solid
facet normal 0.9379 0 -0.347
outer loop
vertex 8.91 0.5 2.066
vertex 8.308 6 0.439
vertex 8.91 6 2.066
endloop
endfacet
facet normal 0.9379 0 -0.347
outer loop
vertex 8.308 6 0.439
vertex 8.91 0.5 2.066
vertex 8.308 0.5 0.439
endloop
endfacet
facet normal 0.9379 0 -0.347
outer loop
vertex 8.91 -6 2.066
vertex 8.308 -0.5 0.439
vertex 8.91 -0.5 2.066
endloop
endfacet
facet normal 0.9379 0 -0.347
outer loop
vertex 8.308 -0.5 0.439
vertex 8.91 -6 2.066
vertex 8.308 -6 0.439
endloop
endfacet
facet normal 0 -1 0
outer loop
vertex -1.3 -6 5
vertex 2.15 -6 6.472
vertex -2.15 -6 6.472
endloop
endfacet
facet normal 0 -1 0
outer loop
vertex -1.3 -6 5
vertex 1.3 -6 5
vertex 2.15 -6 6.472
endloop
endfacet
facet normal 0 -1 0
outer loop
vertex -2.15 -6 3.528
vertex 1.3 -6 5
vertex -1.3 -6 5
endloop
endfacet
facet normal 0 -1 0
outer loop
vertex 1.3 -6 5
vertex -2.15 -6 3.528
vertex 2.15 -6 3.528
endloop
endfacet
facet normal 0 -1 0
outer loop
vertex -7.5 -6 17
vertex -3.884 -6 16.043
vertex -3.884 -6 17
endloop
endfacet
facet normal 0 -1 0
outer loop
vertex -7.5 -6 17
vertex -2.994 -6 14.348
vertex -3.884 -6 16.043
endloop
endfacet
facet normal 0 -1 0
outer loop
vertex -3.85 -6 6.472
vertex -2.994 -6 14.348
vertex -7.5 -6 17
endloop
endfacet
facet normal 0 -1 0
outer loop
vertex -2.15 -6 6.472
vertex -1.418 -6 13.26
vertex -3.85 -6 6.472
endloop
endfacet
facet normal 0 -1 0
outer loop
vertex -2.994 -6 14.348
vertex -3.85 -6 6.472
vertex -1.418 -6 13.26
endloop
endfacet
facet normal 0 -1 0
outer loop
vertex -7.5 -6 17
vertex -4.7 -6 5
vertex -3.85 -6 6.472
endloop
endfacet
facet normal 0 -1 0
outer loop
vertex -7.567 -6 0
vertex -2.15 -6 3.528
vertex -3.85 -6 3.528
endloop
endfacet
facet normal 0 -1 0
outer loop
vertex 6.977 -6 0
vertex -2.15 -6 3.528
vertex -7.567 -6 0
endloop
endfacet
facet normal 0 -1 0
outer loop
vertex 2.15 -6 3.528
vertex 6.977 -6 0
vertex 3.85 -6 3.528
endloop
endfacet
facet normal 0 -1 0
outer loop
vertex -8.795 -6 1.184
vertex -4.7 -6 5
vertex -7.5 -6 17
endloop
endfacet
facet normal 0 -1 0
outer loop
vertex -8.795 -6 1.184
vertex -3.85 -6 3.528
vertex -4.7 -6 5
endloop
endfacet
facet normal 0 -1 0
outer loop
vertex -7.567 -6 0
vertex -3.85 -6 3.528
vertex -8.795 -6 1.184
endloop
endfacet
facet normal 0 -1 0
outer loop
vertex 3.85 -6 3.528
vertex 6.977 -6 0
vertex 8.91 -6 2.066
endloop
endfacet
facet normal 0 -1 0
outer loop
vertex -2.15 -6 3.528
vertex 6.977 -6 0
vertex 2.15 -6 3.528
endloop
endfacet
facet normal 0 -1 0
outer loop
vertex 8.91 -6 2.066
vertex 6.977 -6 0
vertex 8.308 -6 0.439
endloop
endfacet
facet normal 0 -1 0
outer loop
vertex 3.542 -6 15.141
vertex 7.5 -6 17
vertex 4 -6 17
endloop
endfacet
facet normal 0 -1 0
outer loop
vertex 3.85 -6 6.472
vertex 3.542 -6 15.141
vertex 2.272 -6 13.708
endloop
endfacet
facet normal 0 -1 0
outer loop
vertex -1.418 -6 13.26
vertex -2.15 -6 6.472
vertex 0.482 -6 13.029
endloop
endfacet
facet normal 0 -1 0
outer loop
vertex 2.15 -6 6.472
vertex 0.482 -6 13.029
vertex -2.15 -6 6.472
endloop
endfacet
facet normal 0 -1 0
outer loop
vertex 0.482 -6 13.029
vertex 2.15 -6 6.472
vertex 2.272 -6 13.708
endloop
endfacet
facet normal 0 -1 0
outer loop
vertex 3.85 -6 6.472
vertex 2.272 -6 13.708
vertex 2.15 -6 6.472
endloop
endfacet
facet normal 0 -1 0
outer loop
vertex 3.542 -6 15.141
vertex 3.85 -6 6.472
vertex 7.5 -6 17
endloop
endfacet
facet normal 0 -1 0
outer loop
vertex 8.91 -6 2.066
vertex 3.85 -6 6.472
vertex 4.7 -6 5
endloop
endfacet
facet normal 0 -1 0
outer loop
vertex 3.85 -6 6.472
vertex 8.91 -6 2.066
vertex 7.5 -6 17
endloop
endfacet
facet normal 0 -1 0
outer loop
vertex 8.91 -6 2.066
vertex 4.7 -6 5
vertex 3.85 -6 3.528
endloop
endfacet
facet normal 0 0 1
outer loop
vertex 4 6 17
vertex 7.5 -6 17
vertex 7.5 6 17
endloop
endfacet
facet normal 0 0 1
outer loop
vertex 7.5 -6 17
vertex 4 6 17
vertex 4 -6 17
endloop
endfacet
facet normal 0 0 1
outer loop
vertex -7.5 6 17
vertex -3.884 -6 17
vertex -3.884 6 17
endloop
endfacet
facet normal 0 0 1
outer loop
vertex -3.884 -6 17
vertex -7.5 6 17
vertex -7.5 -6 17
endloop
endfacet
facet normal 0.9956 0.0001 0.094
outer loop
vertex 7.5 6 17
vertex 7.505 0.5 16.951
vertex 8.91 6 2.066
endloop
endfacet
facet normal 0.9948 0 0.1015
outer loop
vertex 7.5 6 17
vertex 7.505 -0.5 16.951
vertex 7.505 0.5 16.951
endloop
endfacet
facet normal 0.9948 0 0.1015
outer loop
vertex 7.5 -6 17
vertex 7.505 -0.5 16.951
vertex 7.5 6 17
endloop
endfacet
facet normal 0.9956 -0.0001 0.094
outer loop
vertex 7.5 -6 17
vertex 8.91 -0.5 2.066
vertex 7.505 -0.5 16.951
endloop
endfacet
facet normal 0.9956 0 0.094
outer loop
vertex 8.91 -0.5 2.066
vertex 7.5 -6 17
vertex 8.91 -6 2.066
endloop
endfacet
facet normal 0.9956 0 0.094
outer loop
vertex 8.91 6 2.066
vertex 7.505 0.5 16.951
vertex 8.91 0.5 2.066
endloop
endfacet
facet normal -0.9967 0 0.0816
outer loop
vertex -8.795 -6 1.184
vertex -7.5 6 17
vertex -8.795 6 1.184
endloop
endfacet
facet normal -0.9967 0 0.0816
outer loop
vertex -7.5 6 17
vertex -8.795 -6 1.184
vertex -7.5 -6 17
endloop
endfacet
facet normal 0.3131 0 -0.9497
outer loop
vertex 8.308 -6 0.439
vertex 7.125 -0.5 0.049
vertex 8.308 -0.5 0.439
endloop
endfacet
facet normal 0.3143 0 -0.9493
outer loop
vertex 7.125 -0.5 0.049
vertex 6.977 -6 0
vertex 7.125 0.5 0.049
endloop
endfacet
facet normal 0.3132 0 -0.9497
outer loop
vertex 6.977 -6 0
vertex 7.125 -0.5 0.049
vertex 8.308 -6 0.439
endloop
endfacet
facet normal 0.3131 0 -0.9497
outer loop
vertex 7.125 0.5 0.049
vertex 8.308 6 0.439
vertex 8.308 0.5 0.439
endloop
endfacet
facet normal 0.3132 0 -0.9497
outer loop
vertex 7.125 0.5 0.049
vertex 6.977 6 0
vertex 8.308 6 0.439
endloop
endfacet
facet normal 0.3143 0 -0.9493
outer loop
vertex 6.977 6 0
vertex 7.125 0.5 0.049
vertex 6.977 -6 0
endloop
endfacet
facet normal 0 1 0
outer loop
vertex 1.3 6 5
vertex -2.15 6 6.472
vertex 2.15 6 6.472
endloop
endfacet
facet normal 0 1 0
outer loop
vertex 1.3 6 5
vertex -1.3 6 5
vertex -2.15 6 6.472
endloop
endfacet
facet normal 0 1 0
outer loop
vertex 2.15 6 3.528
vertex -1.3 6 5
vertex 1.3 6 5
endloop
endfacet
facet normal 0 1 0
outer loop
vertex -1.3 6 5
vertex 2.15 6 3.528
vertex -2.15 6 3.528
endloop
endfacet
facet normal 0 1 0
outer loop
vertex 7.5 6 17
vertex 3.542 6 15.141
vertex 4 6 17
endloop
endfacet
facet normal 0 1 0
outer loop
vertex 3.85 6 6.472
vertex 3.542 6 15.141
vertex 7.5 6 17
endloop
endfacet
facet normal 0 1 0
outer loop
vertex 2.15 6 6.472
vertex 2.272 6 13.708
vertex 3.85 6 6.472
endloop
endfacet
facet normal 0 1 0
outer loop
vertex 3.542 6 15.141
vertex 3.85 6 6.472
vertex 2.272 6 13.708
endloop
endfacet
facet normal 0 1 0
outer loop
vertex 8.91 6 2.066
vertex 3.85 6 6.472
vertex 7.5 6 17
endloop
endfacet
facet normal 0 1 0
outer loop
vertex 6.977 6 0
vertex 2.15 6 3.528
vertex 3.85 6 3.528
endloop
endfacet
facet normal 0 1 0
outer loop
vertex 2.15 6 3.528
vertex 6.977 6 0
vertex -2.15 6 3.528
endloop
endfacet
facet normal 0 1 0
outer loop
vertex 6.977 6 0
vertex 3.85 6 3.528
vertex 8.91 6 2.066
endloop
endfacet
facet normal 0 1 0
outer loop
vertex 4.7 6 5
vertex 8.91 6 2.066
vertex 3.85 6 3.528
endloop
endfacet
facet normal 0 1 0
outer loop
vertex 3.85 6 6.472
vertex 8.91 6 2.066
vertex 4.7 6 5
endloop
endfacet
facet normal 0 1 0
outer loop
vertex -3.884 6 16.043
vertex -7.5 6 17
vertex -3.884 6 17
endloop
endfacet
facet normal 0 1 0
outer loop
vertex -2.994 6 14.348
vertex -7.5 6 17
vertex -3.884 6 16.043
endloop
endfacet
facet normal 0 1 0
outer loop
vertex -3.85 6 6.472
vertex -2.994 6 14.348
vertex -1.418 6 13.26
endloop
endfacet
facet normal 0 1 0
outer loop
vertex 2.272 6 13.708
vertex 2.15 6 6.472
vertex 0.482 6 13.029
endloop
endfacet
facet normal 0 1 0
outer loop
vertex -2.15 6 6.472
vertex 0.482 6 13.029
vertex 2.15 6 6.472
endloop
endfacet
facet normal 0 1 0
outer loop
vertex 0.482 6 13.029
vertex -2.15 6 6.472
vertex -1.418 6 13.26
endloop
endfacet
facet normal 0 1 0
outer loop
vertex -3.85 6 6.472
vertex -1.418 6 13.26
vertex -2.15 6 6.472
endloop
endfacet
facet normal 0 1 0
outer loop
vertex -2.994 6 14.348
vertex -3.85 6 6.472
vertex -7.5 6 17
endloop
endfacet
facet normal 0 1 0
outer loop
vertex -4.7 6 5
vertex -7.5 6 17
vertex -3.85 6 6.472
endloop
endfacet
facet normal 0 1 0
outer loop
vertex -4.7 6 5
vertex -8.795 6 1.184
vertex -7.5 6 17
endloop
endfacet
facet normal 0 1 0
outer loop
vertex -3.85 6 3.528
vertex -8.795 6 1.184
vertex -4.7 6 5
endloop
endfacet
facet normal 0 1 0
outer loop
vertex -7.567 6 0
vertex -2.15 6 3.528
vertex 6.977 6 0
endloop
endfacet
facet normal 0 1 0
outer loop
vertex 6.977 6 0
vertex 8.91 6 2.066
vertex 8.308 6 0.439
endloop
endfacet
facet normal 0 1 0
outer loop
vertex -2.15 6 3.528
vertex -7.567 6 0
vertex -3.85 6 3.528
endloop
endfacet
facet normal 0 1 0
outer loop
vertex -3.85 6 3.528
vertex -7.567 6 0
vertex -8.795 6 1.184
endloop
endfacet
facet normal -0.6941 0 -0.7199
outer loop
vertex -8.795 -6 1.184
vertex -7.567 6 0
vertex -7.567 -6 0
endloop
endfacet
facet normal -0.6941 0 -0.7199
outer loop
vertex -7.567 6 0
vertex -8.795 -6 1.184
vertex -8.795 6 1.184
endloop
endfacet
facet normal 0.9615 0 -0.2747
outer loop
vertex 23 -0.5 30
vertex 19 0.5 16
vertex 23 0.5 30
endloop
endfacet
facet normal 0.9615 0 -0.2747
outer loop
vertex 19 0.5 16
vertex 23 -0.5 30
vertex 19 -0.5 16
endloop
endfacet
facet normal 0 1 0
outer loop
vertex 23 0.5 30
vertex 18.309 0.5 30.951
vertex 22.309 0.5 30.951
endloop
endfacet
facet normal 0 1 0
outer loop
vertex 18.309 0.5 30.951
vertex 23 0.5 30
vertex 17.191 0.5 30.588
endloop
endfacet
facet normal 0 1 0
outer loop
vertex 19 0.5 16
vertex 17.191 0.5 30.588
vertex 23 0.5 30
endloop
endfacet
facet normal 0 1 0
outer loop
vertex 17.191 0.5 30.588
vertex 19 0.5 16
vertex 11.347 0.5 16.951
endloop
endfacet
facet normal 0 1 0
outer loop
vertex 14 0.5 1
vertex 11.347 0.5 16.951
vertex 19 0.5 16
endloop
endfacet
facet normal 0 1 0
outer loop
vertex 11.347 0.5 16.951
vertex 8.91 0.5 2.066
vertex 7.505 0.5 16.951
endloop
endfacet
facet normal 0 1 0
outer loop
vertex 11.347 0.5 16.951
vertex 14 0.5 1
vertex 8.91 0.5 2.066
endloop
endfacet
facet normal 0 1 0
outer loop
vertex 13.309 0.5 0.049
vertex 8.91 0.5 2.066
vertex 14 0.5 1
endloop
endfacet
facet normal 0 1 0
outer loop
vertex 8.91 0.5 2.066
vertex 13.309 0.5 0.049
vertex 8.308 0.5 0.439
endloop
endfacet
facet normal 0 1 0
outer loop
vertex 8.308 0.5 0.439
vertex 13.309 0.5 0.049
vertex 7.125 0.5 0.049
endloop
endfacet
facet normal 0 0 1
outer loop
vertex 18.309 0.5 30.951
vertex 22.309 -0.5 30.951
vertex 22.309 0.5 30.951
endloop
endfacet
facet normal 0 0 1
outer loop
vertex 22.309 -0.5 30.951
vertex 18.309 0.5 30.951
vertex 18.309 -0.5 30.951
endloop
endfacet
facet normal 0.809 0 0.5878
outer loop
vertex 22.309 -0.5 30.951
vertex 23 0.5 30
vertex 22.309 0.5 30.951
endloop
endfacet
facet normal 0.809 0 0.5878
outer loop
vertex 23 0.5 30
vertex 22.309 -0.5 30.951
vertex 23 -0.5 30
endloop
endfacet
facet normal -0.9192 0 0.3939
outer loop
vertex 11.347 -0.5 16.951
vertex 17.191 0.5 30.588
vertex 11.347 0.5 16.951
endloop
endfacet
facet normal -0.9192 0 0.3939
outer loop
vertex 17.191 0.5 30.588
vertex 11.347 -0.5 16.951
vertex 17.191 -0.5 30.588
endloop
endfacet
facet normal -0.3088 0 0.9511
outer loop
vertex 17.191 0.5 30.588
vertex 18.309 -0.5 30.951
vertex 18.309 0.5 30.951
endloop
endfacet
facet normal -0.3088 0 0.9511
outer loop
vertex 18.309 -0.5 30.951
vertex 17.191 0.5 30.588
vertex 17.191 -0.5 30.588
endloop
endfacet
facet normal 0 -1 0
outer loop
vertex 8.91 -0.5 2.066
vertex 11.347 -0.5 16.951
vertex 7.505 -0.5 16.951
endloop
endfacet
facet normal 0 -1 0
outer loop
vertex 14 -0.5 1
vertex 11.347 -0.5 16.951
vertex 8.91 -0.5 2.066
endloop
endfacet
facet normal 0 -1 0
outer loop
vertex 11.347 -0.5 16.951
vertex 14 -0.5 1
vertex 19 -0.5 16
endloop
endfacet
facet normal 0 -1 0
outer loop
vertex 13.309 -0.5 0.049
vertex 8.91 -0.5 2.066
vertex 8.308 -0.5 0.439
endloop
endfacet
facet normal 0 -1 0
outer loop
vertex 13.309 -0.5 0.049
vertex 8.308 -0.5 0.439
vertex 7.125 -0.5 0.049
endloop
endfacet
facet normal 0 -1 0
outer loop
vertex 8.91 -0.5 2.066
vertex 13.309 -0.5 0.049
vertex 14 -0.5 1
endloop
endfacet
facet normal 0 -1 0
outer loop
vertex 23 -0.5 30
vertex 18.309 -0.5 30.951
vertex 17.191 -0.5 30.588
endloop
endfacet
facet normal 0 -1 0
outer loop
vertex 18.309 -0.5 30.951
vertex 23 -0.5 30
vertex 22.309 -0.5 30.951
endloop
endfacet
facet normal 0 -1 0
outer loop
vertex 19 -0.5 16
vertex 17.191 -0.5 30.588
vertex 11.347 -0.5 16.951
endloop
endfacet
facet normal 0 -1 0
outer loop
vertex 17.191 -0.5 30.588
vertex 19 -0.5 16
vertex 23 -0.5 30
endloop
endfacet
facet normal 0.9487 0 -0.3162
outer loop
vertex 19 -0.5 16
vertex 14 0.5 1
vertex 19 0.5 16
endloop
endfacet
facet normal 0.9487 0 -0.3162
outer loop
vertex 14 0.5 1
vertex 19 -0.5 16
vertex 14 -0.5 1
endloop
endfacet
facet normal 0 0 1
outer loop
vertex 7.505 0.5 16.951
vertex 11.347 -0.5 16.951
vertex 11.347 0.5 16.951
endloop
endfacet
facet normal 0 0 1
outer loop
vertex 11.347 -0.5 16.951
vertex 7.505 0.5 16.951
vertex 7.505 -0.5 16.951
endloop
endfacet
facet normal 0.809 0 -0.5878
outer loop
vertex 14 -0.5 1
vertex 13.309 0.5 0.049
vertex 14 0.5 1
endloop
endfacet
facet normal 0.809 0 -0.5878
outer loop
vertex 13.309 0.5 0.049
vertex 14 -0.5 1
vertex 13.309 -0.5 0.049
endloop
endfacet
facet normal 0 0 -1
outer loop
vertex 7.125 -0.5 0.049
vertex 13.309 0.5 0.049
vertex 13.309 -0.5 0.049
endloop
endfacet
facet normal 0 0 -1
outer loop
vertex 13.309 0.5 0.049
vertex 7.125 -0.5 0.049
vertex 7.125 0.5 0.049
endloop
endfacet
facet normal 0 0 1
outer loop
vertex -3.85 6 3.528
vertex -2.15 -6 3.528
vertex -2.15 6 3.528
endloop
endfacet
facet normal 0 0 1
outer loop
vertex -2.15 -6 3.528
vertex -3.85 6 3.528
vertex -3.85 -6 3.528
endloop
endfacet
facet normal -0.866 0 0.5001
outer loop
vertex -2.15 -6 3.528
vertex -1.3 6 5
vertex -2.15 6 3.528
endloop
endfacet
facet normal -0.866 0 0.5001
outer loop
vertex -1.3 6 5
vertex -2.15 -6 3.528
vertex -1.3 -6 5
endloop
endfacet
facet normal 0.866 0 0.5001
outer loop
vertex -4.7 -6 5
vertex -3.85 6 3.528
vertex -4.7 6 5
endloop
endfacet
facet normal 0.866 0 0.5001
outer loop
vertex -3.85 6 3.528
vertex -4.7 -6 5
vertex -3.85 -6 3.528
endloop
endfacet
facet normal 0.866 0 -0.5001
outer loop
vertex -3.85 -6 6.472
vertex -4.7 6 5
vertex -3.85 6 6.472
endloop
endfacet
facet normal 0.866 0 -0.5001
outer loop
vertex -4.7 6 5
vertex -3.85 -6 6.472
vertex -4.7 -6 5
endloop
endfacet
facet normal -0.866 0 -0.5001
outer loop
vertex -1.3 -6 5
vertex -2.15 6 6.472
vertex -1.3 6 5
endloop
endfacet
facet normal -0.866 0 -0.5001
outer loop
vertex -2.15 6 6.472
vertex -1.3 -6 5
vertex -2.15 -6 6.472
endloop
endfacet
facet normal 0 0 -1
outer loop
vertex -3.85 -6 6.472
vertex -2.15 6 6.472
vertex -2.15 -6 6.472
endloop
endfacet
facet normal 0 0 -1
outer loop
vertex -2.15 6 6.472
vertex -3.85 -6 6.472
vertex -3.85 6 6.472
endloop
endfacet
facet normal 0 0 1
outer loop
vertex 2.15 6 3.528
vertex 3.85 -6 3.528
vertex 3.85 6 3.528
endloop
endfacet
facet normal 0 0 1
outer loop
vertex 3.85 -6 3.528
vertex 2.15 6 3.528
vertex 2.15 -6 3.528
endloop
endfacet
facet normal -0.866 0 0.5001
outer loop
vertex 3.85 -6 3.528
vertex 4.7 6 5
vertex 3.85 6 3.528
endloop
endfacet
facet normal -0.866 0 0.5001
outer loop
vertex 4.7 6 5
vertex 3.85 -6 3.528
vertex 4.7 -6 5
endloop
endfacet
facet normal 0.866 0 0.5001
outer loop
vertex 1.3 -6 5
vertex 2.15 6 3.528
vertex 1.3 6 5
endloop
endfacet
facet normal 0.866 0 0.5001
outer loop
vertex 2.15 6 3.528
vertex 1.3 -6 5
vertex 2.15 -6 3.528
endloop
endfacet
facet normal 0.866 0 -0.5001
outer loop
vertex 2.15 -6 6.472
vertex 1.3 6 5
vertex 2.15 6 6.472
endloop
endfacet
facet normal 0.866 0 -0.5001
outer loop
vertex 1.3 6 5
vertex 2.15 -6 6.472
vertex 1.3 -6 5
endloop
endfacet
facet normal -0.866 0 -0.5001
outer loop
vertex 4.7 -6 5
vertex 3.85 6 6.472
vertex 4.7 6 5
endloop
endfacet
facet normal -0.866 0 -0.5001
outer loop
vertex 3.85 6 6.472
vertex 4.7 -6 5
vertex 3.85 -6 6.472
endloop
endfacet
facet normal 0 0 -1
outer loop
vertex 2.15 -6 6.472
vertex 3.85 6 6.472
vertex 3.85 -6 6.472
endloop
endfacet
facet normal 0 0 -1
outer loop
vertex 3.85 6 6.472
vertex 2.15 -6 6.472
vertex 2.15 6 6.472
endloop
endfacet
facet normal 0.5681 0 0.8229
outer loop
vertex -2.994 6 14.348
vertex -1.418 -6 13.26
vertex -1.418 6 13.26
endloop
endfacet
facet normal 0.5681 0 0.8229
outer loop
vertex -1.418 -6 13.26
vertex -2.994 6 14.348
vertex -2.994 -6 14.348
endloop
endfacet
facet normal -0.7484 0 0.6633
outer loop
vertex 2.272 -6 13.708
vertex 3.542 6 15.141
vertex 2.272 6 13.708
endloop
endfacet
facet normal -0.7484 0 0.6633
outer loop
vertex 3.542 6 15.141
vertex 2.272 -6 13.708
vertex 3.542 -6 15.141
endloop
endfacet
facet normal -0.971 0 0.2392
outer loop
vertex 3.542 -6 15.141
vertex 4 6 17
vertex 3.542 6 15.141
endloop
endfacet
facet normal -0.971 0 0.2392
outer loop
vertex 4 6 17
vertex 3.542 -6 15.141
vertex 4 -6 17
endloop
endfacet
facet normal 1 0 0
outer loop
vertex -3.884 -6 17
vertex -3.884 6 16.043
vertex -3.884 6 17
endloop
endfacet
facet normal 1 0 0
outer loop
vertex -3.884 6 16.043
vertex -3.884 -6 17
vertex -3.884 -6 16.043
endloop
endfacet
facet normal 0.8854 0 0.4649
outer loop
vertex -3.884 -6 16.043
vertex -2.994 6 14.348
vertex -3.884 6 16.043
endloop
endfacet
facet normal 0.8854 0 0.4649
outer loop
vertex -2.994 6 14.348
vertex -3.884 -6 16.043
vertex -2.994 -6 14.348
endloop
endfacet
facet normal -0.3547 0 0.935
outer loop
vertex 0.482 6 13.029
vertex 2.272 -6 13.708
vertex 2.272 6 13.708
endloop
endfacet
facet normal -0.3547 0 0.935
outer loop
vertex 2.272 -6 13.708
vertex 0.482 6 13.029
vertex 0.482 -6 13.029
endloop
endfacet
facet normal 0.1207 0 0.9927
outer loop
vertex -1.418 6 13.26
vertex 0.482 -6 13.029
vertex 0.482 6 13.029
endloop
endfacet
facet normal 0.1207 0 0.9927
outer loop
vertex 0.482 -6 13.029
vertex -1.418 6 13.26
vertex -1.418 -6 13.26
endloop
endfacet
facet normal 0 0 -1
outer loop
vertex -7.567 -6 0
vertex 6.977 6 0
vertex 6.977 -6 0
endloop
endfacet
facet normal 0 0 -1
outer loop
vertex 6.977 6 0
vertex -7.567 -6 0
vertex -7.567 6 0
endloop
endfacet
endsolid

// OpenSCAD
// file: shapes.scad
// 2D basic shapes
module inverseQuarterCircle(r) {
    difference() {
        square([2*r,2*r]);
        translate([r,r])circle(r=r);
        translate([r,0])square([r,2*r]);
        translate([0,r])square([2*r,r]);
    }
}


module catenary(length=100, width=5, a = 25, step=1) {
    function f(x) = width-(a*cosh(x/length)-a);
    for (i = [-length/2 + step : step : length/2]) {
        //echo("i = ", i, " f(i) = ", f(i));
        polygon([[i-step,0],[i,0],[i,f(i)],[i-step,f(i-step)]]);
    }
}

// 3D basic shapes

module roundedCube(size = [10,10,10],radius=1) {
    hull() {
        // bottom
        translate([size[0]-radius,size[1]-radius,radius])sphere(r=radius,center=true);
        translate([size[0]-radius,radius,radius])sphere(r=radius,center=true);
        translate([radius,size[1]-radius,radius])sphere(r=radius,center=true);
        translate([radius,radius,radius])sphere(r=radius,center=true);
        // top
        translate([size[0]-radius,size[1]-radius,size[2]-radius])sphere(r=radius,center=true);
        translate([size[0]-radius,radius,size[2]-radius])sphere(r=radius,center=true);
        translate([radius,size[1]-radius,size[2]-radius])sphere(r=radius,center=true);
        translate([radius,radius,size[2]-radius])sphere(r=radius,center=true);

    }
}

module roundedCylinder(d, h,rr=1, fn=$fn) {
    translate([0,0,rr])minkowski() {
        cylinder(d=d-2*rr, h=h-2*rr, $fn=fn);
        sphere(r=rr, center = true);
    }
}

module roundedBox(size = [1,1,1],radius=1) {
    hull() {
        translate([size[0]-radius,size[1]-radius,size[2]/2])cylinder(r=radius,h=size[2],center=true);
        translate([size[0]-radius,radius,size[2]/2])cylinder(r=radius,h=size[2],center=true);
        translate([radius,size[1]-radius,size[2]/2])cylinder(r=radius,h=size[2],center=true);
        translate([radius,radius,size[2]/2])cylinder(r=radius,h=size[2],center=true);
    }
}
// file: configuration.scad
print_layer_height = 0.25;
// Using a 623ZZ bearing
bearing_od = 10;
bearing_id = 3;
bearing_h = 4;

m2_dia = 2.4;
m2_nut_dia = 4.5;
m2_nut_slot = 3.9;
m2_nut_height = 2;

m3_dia = 3.4;
m3_nut_dia = 6.8;
m3_nut_slot = 5.8;
m3_nut_height = 3;

m4_dia = 4.5;
m4_nut_dia = 9;
m4_nut_height = 4;

e = 2.718281828;
pi = 3.1415926536;

function cosh(x) = (1 + pow(e, -2 * x)) / (2 * pow(e, -x));

function degtorad(x) = x*pi/180;
// main file
include <configuration.scad>
include <shapes.scad>


module limitSwitchInterruptor() {
    width = bearing_od+5;
    height = 12;
    wall_thickness = 2.5;
    interruptor_thickness = 1;
    // angle is based on delta arm dimesions
    angle = atan2((32 - width)/2, 90);
    difference() {
        union() {
            // base
            translate([0,-height/2,17])rotate([-90,0,0])hull() {
                translate([-width/2, 0, 0])cube([width, 1,height]);
                translate([-width/2, 0, 0])rotate([0,0,angle])translate([2,15,0])cylinder(r=2, h = height);
                translate([width/2, 0, 0])rotate([0,0,-angle])translate([-2,15,0])cylinder(r=2, h = height);
            }
            // limit switch interruptor
            hull() {
                translate([22,0,30])rotate([90,0,0])cylinder(d=2, h=1, center=true);
                translate([18,0,30])rotate([90,0,0])cylinder(d=2, h=1, center=true);

                translate([18,0,16])rotate([90,0,0])cylinder(d=2, h=1, center=true);
                translate([12,0,16])rotate([90,0,0])cylinder(d=2, h=1, center=true);
            }
            hull() {
                translate([5,0,16])rotate([90,0,0])cylinder(d=2, h=1, center=true);
                translate([18,0,16])rotate([90,0,0])cylinder(d=2, h=1, center=true);
                translate([5,0,1])rotate([90,0,0])cylinder(d=2, h=1, center=true);
                translate([13,0,1])rotate([90,0,0])cylinder(d=2, h=1, center=true);
            }

        }
        translate([0,-height/2,17])rotate([-90,0,0]) {
            // screw holes
            translate([-3, 12, 0])cylinder(d=m3_dia, h=height);
            translate([3, 12, 0])cylinder(d=m3_dia, h=height);
            translate([0, 0, 0])cylinder(d=8, h=height);
        }
        // slice tiny edge of bottom
        translate([0,0,-1])cube(size=[width+4, height, 2], center=true);
    }
 }

//$fs=0.2;

module 3DO0005_Limit_Switch_Interruptor() {
    limitSwitchInterruptor();
}

limitSwitchInterruptor();
